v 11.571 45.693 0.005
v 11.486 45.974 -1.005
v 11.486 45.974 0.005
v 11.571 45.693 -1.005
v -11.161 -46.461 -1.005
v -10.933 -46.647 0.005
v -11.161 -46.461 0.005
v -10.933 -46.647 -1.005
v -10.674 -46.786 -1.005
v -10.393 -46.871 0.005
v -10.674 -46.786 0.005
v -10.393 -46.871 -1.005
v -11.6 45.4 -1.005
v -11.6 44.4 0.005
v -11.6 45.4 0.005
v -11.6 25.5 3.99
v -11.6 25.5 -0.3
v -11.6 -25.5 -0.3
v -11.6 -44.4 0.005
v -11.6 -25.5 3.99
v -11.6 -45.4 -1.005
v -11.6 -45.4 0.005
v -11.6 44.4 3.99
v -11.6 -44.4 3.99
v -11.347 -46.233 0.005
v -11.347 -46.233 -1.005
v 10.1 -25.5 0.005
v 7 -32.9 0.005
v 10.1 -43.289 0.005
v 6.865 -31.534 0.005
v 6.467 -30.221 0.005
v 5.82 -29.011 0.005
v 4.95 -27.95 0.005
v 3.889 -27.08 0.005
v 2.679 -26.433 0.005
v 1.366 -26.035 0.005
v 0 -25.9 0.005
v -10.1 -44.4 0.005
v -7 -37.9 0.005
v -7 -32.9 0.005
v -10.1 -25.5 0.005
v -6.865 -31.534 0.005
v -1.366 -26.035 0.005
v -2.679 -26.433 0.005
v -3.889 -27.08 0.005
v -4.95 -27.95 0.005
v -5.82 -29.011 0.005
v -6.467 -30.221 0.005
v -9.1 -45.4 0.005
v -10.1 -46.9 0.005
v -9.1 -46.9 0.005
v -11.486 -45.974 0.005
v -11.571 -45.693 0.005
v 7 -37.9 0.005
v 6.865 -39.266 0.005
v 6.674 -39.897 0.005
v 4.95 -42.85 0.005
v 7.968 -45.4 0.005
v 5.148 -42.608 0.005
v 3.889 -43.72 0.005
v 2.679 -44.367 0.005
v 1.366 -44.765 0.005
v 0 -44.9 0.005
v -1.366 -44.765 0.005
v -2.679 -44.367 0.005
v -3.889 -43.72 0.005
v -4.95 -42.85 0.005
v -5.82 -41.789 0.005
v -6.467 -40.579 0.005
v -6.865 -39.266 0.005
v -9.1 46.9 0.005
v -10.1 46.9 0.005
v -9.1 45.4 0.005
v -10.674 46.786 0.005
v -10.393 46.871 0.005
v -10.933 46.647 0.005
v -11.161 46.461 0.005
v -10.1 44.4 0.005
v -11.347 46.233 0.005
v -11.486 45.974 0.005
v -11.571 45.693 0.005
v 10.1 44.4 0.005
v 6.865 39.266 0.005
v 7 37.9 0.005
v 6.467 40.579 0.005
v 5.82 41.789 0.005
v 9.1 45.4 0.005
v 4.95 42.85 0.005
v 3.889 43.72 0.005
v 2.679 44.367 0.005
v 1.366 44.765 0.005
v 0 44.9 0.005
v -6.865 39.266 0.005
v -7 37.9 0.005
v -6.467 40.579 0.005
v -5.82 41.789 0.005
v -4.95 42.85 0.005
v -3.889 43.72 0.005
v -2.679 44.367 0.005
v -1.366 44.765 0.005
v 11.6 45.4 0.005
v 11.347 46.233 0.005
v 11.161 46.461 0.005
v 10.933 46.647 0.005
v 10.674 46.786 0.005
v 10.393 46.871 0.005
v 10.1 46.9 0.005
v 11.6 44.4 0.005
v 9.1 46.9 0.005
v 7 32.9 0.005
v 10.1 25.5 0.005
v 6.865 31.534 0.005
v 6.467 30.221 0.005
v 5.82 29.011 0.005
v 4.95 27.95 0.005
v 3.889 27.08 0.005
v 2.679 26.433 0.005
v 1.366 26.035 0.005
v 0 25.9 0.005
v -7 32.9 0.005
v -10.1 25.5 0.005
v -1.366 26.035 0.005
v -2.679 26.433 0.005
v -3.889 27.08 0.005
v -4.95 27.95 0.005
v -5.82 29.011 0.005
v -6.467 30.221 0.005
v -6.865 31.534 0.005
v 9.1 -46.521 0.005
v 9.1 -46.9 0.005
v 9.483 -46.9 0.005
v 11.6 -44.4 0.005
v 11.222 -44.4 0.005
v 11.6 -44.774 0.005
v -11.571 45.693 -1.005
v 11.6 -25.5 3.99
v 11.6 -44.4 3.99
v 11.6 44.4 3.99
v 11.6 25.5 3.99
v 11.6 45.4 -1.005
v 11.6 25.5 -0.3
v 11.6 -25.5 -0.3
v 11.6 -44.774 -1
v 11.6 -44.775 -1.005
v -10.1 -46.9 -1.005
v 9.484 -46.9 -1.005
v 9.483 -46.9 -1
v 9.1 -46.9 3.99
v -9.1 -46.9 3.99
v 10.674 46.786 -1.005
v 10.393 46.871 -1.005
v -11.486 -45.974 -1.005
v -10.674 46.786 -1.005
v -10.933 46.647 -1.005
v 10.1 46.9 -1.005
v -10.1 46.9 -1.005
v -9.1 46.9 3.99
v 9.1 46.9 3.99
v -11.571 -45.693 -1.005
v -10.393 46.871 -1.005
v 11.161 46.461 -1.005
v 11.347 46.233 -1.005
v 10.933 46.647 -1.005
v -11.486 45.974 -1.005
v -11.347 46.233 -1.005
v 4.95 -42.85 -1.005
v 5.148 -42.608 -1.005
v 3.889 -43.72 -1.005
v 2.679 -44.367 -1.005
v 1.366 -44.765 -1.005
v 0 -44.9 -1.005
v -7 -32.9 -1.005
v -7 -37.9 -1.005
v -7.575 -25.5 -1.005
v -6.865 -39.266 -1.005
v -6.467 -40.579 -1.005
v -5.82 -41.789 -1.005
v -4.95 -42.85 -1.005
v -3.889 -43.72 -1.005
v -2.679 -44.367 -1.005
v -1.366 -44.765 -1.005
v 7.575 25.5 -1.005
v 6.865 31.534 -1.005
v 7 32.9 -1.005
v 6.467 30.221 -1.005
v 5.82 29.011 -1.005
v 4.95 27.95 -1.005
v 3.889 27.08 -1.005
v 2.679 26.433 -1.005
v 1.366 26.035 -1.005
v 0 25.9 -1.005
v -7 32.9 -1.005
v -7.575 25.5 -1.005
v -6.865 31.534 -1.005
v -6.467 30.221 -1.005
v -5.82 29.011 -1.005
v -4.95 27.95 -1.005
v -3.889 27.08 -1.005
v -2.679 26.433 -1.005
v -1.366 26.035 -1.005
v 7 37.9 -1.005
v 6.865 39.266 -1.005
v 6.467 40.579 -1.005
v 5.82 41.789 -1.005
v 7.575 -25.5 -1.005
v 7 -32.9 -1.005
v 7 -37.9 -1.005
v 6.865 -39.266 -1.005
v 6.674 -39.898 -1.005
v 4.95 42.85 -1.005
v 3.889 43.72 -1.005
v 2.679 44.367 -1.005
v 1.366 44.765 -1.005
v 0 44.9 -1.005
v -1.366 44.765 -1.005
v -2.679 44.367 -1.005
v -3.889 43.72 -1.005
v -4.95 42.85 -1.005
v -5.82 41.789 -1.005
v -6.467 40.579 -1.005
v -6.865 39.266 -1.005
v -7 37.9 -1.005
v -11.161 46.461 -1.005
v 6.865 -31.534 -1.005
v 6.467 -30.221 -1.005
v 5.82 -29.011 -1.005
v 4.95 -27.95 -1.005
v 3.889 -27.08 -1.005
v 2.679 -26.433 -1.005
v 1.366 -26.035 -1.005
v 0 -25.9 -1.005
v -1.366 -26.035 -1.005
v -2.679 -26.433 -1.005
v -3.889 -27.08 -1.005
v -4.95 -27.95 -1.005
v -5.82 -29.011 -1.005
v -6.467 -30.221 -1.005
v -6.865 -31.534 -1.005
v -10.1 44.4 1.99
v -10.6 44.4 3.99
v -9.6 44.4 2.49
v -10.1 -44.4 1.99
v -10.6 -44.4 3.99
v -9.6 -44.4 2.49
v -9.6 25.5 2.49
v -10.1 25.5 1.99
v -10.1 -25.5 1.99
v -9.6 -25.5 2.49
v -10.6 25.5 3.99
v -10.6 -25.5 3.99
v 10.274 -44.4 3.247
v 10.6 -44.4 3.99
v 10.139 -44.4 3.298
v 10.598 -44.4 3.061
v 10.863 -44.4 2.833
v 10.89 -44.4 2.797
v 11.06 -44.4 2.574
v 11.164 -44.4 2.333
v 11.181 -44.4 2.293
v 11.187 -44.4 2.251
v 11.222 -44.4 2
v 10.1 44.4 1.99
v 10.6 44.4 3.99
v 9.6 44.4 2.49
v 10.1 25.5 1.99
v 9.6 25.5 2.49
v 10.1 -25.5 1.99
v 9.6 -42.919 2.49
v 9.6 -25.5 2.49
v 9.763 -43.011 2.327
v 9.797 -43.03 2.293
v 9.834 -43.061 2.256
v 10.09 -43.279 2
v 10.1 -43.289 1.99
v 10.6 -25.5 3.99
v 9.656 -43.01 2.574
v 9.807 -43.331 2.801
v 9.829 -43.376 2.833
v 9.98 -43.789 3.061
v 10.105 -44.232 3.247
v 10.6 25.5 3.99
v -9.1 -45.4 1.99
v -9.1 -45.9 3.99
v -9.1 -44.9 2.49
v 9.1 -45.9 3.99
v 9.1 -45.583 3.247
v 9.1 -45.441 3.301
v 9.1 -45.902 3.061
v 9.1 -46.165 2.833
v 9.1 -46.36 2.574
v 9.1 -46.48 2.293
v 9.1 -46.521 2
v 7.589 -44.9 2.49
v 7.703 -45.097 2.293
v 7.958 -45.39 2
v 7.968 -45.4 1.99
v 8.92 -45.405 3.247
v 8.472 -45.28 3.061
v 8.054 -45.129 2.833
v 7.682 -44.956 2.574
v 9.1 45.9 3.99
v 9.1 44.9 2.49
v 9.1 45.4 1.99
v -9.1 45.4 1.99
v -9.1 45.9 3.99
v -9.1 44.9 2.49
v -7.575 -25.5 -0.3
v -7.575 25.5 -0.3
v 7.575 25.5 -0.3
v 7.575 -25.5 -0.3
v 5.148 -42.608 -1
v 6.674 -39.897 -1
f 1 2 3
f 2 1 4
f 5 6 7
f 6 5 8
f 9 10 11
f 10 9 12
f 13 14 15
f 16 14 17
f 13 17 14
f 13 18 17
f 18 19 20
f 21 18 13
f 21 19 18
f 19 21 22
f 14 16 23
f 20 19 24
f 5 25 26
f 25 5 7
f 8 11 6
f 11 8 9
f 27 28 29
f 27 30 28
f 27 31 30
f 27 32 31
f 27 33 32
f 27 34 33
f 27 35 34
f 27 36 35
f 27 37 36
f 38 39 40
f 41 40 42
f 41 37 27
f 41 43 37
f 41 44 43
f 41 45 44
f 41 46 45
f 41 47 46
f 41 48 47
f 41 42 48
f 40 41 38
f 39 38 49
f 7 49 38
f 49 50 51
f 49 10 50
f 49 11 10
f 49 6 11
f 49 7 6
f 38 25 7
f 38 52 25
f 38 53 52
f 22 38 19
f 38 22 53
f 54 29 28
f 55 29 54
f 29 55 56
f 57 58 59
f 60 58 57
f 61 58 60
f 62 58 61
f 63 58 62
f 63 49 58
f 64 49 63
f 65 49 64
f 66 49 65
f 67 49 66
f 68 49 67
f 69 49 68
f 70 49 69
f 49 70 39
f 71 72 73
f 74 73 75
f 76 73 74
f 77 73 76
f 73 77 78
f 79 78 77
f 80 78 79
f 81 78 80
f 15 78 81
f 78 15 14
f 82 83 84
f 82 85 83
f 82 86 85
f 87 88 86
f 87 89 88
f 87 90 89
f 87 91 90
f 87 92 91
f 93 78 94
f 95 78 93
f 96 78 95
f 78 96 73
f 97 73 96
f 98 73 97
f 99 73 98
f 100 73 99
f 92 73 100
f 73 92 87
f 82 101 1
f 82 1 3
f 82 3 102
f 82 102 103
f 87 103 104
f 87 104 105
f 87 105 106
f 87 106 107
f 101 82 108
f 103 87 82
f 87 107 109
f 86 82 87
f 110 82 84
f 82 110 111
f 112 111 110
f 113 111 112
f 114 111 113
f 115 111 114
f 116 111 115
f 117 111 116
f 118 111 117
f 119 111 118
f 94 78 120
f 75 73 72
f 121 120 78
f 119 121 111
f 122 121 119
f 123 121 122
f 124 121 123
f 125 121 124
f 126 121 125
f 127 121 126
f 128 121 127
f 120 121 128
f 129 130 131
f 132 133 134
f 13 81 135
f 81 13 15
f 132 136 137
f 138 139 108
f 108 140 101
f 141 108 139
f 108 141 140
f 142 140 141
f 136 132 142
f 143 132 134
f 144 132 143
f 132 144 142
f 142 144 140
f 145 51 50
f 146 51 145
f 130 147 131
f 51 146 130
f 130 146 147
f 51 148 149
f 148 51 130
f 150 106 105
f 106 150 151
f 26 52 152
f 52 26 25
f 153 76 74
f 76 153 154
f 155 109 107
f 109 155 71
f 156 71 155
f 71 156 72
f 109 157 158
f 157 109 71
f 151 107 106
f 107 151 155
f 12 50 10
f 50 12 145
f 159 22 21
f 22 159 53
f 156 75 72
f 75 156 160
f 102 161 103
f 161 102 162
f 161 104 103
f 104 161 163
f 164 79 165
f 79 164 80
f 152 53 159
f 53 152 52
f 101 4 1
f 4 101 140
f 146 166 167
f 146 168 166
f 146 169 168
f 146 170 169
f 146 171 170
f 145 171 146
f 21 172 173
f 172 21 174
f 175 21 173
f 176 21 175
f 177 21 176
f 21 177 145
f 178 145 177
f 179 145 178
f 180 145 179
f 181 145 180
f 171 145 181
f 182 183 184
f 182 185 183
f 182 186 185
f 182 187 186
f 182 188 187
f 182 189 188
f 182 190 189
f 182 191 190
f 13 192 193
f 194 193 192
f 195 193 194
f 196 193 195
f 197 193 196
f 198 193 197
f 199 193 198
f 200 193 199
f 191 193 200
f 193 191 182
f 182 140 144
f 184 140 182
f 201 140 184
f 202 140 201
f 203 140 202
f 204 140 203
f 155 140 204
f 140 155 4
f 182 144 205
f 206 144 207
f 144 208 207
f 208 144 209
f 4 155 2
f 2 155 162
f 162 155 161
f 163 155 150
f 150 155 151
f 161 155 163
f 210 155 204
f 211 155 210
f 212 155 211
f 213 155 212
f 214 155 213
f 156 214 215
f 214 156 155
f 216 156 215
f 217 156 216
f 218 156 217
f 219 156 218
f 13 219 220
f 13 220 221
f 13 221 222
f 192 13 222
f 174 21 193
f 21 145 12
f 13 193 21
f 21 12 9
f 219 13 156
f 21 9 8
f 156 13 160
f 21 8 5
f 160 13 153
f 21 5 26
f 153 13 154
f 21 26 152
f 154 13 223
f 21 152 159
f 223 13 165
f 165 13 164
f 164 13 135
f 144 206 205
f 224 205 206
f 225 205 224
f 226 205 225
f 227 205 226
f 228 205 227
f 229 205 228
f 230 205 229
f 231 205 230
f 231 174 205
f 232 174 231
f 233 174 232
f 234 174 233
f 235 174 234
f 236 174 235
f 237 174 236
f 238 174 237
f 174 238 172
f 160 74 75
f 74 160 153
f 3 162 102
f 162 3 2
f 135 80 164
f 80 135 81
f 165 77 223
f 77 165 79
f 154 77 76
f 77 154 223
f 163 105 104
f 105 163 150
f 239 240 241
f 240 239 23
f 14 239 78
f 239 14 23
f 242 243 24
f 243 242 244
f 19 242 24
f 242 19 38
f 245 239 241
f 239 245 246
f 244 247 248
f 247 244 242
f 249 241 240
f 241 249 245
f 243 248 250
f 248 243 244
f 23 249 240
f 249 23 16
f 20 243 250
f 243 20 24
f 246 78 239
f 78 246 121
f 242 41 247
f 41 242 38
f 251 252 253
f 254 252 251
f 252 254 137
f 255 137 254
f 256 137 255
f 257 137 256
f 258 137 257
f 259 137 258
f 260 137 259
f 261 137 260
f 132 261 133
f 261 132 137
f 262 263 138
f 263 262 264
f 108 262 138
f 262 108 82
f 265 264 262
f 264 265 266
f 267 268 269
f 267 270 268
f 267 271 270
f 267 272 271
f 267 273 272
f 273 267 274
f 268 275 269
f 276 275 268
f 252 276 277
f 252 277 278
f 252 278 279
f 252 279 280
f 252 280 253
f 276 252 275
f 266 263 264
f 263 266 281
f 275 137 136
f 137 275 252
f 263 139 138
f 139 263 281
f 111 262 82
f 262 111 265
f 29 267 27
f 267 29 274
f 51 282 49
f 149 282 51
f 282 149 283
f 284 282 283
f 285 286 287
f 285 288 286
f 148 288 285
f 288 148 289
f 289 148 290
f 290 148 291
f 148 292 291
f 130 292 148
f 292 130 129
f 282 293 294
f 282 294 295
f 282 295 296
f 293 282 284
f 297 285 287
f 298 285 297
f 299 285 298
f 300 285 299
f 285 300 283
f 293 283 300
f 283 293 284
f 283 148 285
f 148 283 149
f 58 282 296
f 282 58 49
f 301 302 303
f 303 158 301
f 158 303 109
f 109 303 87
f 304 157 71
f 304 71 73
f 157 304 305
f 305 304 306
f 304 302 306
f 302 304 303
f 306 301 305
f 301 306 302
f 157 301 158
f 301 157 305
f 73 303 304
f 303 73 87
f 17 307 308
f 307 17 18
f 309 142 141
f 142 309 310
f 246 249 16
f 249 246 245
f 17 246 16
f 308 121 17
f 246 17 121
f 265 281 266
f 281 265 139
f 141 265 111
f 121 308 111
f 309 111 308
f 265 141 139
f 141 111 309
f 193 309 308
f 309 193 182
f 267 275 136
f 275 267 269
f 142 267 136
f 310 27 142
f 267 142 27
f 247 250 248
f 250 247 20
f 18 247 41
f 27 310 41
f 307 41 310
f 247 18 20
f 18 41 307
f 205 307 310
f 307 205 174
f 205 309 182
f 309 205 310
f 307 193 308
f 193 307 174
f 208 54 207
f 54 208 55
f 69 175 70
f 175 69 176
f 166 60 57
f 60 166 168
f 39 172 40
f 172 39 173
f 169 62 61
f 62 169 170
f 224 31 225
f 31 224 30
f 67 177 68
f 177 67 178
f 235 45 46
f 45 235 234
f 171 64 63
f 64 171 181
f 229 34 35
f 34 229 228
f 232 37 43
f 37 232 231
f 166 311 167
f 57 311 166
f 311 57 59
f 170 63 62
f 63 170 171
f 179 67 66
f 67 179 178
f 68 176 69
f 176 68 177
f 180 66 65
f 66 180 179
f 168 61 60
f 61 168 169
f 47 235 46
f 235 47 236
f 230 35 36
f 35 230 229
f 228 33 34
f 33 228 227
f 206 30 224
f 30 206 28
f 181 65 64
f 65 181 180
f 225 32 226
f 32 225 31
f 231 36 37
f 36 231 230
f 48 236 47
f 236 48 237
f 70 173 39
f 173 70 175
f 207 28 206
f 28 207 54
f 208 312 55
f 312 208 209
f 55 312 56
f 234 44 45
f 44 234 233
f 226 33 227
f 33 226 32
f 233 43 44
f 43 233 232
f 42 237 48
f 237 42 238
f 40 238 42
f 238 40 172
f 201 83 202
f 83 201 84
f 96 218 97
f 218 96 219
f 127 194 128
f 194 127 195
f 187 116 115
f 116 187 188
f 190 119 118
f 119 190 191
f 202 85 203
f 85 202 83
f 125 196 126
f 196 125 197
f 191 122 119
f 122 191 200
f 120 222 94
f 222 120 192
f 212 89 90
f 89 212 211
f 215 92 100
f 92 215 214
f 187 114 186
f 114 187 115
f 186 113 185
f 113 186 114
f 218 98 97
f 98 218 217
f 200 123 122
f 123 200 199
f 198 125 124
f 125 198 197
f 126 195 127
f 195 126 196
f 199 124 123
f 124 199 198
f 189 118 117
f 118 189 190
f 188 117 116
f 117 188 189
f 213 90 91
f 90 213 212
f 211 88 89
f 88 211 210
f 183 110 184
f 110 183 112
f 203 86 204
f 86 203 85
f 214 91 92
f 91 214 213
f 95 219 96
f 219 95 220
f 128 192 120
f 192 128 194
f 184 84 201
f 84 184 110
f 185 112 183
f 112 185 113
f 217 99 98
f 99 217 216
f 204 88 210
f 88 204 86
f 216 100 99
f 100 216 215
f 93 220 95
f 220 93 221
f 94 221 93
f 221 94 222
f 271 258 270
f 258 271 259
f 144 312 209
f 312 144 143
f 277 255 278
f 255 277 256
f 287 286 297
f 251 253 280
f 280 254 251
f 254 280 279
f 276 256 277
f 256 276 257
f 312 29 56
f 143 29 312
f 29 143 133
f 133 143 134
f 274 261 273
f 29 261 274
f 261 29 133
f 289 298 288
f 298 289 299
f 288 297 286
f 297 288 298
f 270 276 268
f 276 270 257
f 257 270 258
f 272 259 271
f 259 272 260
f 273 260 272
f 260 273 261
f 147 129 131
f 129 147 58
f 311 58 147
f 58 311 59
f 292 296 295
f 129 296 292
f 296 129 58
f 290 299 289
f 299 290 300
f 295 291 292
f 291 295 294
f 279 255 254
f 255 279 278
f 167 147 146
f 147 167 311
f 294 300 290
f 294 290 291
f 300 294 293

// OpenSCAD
// length of bar
le=90.8; // [10:0.2:100]

// width of bar
wi=20.2; // [10:0.2:20]

// thickness of battery bar
h1 = 2; // [0.2:0.1:20]

// height of cover
de = 1.0; // [0.5:0.1:2]

// hook width
hookwidth=3; // [2:0.5:5]

// hole offset from end
hoff = 10;  // [5:0.2:100]

// hole diameter
hd=14; // [2:0.2:20]

// hole elongation
hdl=5; // [2:0.2:20]

// connection diameter
dcon=3; // [0.4:0.2:4]

/* [protector] */
// length
plen=51; // [0:0.5:100]

// thickness with protector
h1p=2.6; // [0.3:0.1:22]

/* [Hook parameters] */
// hook depth
d1 = 1.5; // [1:0.5:3]

// nose length
d2 = .5; // [0.2:0.1:2]

// height of hook slope
h2 = 0.5; // [0.2:0.1:1]

h3 = 1.5; // height of top slope


ds = 0.0; // flange at base

_d=0.01;

hfr=d2+0.5;
$fn=$preview?10:32;

module p_hook() {
    polygon(points=[[0,0],[d1+ds,0],[d1,ds],[d1,h1], [d1+d2,h1+h2], [d1*2/3,h1+h2+h3], [0,h1+h2+h3]], paths=[[0,1,2,3,4,5,6]]);
}

module hook(w) {
    rotate([90,0,0])
    linear_extrude(w, convexity=4,center=true)
    p_hook();
    
}

module cyl() {
    translate([0,0,-de/2]) cylinder(r=d1, h=de+_d, center=true);
}

module hole() {
    translate([0,0,-de/2])
    hull() {
       translate([0,hdl/2,0]) cylinder(d=hd, h=de+_d*3, center=true);
       translate([0,-hdl/2,0]) cylinder(d=hd, h=de+_d*3, center=true);
    }
}

module main() {
    // translate([0,0,-de/2]) cube([wi+2*d1,le+2*d1,de], center=true);
    hull() {
        translate([-wi/2,-le/2,0]) cyl();
        translate([wi/2,-le/2,0]) cyl();
        translate([wi/2,le/2,0]) cyl();
        translate([-wi/2,le/2,0]) cyl();
    }
    translate([-wi/2-d1,0,-_d]) hook(le-hfr*2);
    translate([wi/2+d1,0,-_d]) rotate(180) hook(le-hfr*2);
    translate([0,-le/2-d1,-_d]) rotate(90) hook(wi-hfr*2);
    translate([0,le/2+d1,-_d]) rotate(270) hook(wi-hfr*2);

//The actual coverplate

}

module main_d() {
    difference() {
        main();
        translate([0,-le/2+hoff,0]) hole();
        translate([0,le/2-hoff,0]) hole();
    
        translate([0,hoff-le/2,-dcon/3])
        rotate([0,0,atan2(wi/2,hoff)])
        rotate([90,0,0])
        hull() {
            cylinder(h=100,d=dcon);
            translate([0,dcon,0]) cylinder(h=100,d=dcon);
        }
        if(plen>0) {
            translate([0,0,50-(h1p-h1)/2]) cube([100,plen,100], center=true);
            cube([wi*3/4,plen,100], center=true);
        }
    }
}

main_d();
